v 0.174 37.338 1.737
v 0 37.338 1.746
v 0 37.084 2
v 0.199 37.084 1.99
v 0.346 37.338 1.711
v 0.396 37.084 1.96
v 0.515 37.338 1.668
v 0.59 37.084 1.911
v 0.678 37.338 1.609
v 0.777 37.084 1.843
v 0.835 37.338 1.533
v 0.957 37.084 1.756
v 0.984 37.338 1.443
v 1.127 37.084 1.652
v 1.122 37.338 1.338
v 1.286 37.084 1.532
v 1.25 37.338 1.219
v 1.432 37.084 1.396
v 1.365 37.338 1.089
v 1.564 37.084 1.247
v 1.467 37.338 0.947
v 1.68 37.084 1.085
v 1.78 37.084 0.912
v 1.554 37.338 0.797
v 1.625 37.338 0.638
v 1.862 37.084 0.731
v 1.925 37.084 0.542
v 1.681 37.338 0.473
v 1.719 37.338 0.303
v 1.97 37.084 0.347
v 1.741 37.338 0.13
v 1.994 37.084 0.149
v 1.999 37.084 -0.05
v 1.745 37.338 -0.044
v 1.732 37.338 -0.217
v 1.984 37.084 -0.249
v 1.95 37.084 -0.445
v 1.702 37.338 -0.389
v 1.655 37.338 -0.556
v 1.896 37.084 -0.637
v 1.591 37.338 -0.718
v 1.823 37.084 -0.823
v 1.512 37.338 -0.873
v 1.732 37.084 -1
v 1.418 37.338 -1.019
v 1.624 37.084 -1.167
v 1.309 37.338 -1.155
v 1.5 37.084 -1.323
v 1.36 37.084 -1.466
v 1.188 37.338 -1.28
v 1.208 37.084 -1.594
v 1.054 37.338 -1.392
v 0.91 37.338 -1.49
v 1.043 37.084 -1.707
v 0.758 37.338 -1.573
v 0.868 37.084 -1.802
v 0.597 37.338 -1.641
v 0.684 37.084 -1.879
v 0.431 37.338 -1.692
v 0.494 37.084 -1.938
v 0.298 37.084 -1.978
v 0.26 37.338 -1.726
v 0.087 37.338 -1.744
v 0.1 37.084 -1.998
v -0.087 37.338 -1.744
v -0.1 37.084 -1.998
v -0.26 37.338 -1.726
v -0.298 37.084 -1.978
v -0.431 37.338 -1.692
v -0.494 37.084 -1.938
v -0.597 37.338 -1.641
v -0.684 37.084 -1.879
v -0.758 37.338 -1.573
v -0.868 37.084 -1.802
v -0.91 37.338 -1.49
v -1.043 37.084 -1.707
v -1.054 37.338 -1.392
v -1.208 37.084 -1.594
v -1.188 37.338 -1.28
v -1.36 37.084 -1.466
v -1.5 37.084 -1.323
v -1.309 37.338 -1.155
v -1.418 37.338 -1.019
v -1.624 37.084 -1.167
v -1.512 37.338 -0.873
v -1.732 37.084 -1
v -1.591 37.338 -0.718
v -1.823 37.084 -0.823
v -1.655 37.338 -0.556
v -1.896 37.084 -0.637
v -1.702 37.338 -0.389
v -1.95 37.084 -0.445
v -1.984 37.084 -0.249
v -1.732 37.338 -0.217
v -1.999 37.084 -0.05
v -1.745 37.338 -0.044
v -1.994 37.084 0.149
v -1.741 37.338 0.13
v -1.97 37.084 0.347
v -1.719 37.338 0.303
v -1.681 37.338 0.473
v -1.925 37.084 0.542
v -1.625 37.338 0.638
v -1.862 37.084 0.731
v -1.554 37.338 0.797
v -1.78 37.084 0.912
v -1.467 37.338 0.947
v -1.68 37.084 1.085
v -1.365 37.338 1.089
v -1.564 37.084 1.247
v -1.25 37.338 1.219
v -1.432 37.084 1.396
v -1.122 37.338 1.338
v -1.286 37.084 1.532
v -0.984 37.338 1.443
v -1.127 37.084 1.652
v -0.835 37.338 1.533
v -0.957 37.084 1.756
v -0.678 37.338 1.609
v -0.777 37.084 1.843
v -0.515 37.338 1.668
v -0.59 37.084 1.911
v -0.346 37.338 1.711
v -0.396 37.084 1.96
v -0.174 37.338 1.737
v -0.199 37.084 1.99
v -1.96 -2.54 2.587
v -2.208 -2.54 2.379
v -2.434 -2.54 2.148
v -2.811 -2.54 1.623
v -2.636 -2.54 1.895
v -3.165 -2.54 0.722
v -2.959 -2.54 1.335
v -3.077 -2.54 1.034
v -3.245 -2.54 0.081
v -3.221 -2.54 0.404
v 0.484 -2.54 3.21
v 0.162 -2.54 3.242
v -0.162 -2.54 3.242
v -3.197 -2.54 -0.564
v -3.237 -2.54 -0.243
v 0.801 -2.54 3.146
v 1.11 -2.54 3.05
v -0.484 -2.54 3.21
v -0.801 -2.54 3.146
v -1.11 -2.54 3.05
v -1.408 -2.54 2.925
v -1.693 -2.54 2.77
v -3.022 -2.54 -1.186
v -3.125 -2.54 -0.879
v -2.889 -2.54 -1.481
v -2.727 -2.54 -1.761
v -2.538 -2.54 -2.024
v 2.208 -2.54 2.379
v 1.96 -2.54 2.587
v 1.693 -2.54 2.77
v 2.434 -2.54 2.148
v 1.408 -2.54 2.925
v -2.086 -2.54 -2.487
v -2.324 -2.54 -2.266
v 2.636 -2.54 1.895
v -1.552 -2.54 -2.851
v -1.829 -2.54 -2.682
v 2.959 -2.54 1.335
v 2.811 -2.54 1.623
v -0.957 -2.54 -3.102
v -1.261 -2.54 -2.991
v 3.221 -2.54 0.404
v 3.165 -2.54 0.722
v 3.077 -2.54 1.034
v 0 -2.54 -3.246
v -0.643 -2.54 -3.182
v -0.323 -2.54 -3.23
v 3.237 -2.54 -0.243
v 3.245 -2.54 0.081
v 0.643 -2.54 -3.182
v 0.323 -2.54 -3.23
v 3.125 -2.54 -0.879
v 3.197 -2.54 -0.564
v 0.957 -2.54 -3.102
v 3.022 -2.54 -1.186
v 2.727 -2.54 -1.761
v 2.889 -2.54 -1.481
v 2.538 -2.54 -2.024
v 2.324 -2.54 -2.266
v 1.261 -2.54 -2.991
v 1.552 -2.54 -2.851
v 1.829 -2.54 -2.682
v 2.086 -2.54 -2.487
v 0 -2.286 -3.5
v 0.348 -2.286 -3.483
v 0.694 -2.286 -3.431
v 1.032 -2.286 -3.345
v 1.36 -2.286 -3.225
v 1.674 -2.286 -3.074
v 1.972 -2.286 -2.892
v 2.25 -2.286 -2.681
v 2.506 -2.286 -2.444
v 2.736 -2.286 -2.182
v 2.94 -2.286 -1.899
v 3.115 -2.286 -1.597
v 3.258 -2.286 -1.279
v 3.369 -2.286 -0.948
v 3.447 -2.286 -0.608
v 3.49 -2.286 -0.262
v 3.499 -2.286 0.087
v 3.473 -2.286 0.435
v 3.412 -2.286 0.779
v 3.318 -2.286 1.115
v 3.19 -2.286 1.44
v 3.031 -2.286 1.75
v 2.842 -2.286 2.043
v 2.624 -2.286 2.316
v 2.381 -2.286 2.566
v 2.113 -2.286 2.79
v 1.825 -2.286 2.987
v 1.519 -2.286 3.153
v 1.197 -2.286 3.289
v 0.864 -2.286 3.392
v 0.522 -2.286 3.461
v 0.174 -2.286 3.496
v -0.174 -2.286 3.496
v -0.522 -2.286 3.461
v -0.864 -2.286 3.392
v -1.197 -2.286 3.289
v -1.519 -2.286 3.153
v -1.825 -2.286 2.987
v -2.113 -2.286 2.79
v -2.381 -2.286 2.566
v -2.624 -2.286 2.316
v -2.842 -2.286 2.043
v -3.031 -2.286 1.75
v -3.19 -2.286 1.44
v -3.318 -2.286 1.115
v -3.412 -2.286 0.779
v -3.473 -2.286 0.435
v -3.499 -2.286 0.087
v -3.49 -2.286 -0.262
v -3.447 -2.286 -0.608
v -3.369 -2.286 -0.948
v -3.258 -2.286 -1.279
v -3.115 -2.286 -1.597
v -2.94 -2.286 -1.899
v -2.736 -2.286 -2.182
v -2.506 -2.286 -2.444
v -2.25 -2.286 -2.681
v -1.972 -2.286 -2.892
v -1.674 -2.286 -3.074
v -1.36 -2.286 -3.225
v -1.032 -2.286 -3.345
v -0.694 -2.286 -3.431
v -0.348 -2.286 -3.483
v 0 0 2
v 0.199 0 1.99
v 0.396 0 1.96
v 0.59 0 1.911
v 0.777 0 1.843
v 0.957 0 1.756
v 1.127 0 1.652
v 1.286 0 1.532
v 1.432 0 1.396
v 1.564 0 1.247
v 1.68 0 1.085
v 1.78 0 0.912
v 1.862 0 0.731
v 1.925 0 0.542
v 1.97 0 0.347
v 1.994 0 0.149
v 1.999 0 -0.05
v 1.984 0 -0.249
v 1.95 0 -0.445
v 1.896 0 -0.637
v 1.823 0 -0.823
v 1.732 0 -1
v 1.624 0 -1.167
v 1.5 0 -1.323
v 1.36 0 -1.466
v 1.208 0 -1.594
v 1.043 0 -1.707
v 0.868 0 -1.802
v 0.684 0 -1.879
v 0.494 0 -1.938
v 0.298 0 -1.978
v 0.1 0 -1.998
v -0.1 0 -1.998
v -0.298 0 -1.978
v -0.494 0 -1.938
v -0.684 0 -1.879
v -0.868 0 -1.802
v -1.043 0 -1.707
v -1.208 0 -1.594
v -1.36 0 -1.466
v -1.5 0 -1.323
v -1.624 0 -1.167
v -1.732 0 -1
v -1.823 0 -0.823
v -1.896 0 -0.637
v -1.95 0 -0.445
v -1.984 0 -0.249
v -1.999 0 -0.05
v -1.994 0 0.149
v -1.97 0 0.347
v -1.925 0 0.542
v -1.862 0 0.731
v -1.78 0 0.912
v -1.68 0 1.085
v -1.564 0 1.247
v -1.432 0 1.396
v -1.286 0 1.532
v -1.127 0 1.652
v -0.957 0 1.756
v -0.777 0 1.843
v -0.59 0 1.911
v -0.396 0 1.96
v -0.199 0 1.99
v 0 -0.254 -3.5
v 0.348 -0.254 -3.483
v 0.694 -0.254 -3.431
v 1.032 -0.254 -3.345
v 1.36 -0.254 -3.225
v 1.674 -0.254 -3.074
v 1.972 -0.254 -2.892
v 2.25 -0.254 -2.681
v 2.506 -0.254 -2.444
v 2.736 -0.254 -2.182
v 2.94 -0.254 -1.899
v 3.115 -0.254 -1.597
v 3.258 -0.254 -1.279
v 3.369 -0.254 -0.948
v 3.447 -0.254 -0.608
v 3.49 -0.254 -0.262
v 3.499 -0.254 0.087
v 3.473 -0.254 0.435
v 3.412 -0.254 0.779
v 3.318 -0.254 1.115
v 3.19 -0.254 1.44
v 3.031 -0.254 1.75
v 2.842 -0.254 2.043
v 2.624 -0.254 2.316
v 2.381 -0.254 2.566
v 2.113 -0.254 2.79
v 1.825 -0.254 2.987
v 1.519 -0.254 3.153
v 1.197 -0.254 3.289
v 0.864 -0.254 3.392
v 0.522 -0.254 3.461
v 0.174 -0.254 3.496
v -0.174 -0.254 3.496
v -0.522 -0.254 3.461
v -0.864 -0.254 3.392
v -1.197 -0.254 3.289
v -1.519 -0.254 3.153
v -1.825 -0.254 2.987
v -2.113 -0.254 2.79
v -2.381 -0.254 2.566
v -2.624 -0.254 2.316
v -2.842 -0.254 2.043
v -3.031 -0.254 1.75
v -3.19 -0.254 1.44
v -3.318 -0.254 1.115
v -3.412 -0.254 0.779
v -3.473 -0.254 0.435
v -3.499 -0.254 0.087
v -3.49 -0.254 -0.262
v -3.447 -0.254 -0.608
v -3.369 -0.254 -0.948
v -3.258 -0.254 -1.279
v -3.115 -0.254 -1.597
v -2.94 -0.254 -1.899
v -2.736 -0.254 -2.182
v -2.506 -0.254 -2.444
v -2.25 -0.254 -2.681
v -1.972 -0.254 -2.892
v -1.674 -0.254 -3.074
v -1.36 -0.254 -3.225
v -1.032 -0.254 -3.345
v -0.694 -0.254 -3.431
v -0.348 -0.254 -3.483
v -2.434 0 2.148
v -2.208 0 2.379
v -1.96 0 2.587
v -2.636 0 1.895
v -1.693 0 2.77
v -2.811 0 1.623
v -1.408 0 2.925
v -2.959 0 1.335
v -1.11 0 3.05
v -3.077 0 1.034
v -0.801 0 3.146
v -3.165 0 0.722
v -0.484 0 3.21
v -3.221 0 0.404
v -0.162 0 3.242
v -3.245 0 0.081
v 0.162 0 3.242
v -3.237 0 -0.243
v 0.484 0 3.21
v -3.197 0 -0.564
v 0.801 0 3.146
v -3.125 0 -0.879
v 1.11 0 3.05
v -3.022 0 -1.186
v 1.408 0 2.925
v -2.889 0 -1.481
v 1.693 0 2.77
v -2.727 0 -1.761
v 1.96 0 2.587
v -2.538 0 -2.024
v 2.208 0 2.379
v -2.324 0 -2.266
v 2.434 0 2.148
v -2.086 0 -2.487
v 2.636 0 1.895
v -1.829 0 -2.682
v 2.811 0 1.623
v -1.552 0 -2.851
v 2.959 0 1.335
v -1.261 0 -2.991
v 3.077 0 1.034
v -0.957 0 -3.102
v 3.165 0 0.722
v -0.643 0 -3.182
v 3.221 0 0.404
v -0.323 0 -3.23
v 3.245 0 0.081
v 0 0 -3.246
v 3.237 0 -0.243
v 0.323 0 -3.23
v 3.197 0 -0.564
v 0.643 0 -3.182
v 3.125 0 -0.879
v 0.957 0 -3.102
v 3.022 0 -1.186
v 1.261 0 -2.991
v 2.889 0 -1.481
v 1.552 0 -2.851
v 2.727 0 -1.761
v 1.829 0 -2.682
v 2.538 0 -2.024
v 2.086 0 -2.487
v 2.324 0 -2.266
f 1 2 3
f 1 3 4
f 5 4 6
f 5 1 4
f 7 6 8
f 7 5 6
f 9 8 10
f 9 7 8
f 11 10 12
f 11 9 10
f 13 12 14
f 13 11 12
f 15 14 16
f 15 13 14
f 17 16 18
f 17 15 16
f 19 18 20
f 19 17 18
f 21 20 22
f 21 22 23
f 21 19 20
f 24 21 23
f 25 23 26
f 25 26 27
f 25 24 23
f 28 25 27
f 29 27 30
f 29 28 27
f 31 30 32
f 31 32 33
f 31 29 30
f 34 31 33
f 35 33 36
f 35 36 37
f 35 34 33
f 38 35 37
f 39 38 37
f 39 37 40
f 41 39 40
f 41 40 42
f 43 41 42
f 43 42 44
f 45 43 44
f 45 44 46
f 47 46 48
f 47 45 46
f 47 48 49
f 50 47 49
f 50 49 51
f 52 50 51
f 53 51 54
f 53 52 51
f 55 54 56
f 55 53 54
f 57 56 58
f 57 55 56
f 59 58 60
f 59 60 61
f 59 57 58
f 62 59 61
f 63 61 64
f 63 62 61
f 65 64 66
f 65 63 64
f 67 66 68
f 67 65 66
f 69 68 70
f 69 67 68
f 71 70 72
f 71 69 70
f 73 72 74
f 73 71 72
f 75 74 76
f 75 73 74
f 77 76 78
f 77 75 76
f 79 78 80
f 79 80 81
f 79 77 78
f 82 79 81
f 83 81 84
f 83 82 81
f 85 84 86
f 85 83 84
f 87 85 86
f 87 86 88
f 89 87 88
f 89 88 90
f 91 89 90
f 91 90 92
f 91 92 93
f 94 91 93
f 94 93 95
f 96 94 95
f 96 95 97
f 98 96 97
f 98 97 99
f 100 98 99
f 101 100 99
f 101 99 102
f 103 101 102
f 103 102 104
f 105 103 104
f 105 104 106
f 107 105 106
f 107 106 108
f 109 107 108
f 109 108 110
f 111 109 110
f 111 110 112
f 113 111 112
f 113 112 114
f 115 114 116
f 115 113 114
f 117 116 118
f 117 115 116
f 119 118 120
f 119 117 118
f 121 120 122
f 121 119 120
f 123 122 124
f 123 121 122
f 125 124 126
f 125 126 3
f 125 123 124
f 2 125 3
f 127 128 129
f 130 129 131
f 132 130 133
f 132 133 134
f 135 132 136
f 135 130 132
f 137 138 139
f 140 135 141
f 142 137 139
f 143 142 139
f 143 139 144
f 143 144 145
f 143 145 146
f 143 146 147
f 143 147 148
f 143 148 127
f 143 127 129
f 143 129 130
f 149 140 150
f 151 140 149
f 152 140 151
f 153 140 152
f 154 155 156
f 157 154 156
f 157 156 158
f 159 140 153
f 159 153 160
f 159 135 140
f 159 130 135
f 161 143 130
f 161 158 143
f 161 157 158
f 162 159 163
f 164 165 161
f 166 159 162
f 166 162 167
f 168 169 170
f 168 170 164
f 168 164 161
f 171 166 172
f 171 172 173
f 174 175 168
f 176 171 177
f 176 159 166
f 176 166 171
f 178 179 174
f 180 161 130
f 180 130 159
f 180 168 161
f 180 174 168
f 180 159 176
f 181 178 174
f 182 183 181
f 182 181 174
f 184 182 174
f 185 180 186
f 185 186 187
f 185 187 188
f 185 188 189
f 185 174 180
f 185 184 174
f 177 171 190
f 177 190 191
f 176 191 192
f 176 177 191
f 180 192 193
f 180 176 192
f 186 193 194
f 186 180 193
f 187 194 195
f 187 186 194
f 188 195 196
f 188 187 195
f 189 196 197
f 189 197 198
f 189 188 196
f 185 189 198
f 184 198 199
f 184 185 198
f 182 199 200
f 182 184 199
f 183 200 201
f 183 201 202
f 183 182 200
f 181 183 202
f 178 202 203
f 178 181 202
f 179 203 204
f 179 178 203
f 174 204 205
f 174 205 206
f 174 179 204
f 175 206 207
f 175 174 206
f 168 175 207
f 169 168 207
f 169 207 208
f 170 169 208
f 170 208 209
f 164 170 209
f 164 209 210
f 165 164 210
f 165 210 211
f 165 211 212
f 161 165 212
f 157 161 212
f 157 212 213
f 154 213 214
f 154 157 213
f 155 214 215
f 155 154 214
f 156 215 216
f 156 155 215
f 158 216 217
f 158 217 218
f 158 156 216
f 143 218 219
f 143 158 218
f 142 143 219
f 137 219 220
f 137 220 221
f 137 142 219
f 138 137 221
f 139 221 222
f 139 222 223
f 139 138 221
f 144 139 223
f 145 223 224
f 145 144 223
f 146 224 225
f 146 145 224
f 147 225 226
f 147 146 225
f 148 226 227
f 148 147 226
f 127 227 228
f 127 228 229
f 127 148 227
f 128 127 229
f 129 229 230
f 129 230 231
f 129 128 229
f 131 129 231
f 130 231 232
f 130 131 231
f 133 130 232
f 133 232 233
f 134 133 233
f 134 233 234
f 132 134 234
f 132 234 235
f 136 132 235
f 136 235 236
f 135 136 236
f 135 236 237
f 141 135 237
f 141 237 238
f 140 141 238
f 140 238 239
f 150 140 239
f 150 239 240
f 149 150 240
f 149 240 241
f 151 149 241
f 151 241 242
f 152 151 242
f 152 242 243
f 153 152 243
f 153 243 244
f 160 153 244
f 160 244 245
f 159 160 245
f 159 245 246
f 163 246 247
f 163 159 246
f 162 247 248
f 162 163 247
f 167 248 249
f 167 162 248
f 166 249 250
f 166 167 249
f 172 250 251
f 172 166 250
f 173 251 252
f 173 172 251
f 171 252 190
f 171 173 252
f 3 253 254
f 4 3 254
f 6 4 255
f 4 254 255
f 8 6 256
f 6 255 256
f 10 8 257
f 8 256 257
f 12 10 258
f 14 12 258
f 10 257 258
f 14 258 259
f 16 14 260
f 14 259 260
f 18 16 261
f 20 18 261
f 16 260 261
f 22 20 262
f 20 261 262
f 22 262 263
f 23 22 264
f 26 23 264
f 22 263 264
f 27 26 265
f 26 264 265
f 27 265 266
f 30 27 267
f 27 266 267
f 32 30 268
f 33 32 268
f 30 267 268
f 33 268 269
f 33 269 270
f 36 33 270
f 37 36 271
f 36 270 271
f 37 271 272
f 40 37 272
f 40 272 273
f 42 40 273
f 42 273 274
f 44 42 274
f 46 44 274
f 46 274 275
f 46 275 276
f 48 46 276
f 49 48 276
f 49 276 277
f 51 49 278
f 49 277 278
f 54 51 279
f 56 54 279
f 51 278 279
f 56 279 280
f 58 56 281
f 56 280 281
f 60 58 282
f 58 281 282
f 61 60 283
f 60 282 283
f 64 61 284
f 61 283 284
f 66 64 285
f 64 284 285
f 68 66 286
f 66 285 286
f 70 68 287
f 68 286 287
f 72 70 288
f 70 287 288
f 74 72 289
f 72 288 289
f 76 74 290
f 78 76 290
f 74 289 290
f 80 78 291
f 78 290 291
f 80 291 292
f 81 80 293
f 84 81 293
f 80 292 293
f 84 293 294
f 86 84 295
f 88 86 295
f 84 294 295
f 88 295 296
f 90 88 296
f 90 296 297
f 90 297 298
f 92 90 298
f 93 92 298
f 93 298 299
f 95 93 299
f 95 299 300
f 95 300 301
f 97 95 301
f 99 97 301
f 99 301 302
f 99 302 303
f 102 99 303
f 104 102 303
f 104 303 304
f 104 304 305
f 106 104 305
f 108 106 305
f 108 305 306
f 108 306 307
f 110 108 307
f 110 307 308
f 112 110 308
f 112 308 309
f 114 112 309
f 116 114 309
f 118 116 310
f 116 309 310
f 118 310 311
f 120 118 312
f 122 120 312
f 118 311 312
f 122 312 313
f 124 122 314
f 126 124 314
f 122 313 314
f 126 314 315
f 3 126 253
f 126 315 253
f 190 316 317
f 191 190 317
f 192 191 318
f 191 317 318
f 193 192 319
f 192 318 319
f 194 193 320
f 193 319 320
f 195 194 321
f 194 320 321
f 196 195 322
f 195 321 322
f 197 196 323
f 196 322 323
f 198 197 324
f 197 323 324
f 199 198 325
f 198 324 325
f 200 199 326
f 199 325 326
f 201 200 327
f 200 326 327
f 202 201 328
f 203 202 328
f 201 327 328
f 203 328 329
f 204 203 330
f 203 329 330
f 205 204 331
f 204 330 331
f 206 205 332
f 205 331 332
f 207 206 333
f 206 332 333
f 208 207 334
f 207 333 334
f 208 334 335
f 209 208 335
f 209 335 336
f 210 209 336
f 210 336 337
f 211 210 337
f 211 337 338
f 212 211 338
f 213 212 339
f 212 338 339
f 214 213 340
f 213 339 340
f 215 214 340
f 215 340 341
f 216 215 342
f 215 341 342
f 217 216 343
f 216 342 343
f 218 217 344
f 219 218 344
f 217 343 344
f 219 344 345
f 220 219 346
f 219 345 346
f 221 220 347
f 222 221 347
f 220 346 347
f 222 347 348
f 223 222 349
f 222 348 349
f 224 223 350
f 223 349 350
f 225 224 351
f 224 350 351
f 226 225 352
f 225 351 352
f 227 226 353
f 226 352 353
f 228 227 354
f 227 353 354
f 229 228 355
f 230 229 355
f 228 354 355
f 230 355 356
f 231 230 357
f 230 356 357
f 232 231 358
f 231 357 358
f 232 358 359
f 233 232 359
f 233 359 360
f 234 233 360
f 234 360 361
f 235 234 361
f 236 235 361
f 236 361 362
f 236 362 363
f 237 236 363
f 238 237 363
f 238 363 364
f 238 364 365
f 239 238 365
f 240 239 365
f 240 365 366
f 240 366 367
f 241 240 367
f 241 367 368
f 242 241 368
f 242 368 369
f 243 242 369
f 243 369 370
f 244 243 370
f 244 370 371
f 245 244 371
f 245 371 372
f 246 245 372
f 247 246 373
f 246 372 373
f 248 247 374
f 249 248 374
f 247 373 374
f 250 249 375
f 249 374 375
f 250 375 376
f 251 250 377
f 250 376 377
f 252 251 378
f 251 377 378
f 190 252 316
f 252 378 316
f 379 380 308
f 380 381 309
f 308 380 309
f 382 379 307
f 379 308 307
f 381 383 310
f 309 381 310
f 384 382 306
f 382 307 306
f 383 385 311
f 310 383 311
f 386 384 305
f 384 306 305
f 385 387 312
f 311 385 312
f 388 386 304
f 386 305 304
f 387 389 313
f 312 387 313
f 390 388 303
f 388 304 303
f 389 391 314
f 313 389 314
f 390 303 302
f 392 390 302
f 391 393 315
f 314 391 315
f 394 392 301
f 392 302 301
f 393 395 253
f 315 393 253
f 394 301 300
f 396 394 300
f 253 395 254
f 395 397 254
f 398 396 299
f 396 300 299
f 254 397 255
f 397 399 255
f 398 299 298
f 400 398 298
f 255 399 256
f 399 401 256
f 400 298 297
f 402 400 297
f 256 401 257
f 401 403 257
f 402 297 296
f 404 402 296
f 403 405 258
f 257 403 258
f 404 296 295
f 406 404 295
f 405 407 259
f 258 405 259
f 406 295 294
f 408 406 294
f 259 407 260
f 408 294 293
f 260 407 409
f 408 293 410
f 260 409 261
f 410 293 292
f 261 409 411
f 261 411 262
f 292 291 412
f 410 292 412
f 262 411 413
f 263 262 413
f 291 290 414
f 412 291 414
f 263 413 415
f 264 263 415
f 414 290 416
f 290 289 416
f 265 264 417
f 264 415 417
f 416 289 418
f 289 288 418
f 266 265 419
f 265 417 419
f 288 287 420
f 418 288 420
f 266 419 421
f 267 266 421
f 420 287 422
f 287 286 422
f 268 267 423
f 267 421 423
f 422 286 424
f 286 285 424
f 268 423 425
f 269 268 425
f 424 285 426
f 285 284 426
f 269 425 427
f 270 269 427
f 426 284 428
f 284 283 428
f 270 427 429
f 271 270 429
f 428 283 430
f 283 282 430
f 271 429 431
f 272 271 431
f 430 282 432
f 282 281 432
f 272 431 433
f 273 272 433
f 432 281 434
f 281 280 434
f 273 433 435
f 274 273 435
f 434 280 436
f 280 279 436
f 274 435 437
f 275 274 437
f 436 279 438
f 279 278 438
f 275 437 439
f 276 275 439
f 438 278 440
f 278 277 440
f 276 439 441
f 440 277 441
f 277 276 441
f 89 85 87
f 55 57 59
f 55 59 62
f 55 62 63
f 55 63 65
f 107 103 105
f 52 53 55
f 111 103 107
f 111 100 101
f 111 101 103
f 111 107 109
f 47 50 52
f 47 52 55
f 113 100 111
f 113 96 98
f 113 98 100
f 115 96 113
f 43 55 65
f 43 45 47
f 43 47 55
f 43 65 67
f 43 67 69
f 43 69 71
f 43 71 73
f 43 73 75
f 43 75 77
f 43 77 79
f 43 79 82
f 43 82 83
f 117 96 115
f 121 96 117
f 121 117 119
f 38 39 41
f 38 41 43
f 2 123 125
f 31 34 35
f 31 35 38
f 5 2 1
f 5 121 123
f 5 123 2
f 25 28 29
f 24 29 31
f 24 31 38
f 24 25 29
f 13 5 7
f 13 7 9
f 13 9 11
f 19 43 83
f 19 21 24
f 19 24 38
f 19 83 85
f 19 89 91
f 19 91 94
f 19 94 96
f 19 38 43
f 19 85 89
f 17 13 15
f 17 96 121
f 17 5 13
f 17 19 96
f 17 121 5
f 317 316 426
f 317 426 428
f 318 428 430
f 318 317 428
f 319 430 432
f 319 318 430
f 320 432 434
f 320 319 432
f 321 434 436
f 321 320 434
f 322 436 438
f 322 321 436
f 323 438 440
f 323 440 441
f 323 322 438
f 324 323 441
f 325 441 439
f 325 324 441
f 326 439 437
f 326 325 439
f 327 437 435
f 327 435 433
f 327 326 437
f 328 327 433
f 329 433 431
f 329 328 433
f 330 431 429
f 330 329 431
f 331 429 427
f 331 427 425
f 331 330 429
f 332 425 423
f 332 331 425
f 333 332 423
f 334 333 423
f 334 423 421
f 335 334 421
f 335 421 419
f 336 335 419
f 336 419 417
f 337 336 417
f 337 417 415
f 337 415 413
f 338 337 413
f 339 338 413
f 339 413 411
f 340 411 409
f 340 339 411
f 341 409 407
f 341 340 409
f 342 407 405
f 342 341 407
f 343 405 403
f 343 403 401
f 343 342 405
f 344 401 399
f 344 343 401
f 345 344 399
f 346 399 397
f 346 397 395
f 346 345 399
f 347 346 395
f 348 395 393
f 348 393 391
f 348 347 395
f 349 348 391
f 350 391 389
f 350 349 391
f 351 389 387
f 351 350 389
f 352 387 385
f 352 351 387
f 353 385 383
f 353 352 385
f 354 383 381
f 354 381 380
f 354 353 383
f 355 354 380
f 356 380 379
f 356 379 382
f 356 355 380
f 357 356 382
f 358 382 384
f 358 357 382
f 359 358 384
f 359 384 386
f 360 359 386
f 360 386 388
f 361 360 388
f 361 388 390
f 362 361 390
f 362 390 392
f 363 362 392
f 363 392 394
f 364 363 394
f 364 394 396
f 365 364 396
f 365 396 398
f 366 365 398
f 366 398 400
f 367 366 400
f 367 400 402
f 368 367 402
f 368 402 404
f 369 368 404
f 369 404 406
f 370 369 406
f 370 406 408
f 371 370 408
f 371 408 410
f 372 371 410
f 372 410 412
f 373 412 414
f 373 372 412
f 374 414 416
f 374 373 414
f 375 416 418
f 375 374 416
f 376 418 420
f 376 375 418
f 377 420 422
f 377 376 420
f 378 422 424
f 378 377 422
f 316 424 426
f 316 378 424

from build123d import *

# Parameters (mm, degrees)
SKETCH1_R           = 2
BOSS_EXTRUDE1_DEPTH = 37.338
SKETCH2_R           = 3.5
BOSS_EXTRUDE2_DEPTH = 2.54
CHAMFER1_SIZE       = 0.254
CHAMFER2_SIZE       = 0.254
CHAMFER3_SIZE       = 0.254


with BuildPart() as part:
    # Sketch1 → Boss-Extrude1 (new body)
    with BuildSketch(Plane(origin=(0, 0, 0), x_dir=(1, 0, 0), z_dir=(0, 1, 0))):
        with Locations(Location((0, 0, 0), (0, 0, 270))):
            Circle(SKETCH1_R)
    extrude(amount=BOSS_EXTRUDE1_DEPTH)

    # Sketch2 → Boss-Extrude2 (add)
    with BuildSketch(Plane.XZ):
        with Locations(Location((0, 0, 0), (0, 0, 270))):
            Circle(SKETCH2_R)
    extrude(amount=BOSS_EXTRUDE2_DEPTH)

    # Chamfer1
    chamfer1_edges = [part.edges().sort_by_distance(p)[0] for p in [
        (0, -2.54, 3.5),
    ]]
    chamfer(chamfer1_edges, length=CHAMFER1_SIZE)

    # Chamfer2
    chamfer2_edges = [part.edges().sort_by_distance(p)[0] for p in [
        (0, 37.338, -2),
    ]]
    chamfer(chamfer2_edges, length=CHAMFER2_SIZE)

    # Chamfer3
    chamfer3_edges = [part.edges().sort_by_distance(p)[0] for p in [
        (0, 0, 3.5),
    ]]
    chamfer(chamfer3_edges, length=CHAMFER3_SIZE)


solid = part.part
